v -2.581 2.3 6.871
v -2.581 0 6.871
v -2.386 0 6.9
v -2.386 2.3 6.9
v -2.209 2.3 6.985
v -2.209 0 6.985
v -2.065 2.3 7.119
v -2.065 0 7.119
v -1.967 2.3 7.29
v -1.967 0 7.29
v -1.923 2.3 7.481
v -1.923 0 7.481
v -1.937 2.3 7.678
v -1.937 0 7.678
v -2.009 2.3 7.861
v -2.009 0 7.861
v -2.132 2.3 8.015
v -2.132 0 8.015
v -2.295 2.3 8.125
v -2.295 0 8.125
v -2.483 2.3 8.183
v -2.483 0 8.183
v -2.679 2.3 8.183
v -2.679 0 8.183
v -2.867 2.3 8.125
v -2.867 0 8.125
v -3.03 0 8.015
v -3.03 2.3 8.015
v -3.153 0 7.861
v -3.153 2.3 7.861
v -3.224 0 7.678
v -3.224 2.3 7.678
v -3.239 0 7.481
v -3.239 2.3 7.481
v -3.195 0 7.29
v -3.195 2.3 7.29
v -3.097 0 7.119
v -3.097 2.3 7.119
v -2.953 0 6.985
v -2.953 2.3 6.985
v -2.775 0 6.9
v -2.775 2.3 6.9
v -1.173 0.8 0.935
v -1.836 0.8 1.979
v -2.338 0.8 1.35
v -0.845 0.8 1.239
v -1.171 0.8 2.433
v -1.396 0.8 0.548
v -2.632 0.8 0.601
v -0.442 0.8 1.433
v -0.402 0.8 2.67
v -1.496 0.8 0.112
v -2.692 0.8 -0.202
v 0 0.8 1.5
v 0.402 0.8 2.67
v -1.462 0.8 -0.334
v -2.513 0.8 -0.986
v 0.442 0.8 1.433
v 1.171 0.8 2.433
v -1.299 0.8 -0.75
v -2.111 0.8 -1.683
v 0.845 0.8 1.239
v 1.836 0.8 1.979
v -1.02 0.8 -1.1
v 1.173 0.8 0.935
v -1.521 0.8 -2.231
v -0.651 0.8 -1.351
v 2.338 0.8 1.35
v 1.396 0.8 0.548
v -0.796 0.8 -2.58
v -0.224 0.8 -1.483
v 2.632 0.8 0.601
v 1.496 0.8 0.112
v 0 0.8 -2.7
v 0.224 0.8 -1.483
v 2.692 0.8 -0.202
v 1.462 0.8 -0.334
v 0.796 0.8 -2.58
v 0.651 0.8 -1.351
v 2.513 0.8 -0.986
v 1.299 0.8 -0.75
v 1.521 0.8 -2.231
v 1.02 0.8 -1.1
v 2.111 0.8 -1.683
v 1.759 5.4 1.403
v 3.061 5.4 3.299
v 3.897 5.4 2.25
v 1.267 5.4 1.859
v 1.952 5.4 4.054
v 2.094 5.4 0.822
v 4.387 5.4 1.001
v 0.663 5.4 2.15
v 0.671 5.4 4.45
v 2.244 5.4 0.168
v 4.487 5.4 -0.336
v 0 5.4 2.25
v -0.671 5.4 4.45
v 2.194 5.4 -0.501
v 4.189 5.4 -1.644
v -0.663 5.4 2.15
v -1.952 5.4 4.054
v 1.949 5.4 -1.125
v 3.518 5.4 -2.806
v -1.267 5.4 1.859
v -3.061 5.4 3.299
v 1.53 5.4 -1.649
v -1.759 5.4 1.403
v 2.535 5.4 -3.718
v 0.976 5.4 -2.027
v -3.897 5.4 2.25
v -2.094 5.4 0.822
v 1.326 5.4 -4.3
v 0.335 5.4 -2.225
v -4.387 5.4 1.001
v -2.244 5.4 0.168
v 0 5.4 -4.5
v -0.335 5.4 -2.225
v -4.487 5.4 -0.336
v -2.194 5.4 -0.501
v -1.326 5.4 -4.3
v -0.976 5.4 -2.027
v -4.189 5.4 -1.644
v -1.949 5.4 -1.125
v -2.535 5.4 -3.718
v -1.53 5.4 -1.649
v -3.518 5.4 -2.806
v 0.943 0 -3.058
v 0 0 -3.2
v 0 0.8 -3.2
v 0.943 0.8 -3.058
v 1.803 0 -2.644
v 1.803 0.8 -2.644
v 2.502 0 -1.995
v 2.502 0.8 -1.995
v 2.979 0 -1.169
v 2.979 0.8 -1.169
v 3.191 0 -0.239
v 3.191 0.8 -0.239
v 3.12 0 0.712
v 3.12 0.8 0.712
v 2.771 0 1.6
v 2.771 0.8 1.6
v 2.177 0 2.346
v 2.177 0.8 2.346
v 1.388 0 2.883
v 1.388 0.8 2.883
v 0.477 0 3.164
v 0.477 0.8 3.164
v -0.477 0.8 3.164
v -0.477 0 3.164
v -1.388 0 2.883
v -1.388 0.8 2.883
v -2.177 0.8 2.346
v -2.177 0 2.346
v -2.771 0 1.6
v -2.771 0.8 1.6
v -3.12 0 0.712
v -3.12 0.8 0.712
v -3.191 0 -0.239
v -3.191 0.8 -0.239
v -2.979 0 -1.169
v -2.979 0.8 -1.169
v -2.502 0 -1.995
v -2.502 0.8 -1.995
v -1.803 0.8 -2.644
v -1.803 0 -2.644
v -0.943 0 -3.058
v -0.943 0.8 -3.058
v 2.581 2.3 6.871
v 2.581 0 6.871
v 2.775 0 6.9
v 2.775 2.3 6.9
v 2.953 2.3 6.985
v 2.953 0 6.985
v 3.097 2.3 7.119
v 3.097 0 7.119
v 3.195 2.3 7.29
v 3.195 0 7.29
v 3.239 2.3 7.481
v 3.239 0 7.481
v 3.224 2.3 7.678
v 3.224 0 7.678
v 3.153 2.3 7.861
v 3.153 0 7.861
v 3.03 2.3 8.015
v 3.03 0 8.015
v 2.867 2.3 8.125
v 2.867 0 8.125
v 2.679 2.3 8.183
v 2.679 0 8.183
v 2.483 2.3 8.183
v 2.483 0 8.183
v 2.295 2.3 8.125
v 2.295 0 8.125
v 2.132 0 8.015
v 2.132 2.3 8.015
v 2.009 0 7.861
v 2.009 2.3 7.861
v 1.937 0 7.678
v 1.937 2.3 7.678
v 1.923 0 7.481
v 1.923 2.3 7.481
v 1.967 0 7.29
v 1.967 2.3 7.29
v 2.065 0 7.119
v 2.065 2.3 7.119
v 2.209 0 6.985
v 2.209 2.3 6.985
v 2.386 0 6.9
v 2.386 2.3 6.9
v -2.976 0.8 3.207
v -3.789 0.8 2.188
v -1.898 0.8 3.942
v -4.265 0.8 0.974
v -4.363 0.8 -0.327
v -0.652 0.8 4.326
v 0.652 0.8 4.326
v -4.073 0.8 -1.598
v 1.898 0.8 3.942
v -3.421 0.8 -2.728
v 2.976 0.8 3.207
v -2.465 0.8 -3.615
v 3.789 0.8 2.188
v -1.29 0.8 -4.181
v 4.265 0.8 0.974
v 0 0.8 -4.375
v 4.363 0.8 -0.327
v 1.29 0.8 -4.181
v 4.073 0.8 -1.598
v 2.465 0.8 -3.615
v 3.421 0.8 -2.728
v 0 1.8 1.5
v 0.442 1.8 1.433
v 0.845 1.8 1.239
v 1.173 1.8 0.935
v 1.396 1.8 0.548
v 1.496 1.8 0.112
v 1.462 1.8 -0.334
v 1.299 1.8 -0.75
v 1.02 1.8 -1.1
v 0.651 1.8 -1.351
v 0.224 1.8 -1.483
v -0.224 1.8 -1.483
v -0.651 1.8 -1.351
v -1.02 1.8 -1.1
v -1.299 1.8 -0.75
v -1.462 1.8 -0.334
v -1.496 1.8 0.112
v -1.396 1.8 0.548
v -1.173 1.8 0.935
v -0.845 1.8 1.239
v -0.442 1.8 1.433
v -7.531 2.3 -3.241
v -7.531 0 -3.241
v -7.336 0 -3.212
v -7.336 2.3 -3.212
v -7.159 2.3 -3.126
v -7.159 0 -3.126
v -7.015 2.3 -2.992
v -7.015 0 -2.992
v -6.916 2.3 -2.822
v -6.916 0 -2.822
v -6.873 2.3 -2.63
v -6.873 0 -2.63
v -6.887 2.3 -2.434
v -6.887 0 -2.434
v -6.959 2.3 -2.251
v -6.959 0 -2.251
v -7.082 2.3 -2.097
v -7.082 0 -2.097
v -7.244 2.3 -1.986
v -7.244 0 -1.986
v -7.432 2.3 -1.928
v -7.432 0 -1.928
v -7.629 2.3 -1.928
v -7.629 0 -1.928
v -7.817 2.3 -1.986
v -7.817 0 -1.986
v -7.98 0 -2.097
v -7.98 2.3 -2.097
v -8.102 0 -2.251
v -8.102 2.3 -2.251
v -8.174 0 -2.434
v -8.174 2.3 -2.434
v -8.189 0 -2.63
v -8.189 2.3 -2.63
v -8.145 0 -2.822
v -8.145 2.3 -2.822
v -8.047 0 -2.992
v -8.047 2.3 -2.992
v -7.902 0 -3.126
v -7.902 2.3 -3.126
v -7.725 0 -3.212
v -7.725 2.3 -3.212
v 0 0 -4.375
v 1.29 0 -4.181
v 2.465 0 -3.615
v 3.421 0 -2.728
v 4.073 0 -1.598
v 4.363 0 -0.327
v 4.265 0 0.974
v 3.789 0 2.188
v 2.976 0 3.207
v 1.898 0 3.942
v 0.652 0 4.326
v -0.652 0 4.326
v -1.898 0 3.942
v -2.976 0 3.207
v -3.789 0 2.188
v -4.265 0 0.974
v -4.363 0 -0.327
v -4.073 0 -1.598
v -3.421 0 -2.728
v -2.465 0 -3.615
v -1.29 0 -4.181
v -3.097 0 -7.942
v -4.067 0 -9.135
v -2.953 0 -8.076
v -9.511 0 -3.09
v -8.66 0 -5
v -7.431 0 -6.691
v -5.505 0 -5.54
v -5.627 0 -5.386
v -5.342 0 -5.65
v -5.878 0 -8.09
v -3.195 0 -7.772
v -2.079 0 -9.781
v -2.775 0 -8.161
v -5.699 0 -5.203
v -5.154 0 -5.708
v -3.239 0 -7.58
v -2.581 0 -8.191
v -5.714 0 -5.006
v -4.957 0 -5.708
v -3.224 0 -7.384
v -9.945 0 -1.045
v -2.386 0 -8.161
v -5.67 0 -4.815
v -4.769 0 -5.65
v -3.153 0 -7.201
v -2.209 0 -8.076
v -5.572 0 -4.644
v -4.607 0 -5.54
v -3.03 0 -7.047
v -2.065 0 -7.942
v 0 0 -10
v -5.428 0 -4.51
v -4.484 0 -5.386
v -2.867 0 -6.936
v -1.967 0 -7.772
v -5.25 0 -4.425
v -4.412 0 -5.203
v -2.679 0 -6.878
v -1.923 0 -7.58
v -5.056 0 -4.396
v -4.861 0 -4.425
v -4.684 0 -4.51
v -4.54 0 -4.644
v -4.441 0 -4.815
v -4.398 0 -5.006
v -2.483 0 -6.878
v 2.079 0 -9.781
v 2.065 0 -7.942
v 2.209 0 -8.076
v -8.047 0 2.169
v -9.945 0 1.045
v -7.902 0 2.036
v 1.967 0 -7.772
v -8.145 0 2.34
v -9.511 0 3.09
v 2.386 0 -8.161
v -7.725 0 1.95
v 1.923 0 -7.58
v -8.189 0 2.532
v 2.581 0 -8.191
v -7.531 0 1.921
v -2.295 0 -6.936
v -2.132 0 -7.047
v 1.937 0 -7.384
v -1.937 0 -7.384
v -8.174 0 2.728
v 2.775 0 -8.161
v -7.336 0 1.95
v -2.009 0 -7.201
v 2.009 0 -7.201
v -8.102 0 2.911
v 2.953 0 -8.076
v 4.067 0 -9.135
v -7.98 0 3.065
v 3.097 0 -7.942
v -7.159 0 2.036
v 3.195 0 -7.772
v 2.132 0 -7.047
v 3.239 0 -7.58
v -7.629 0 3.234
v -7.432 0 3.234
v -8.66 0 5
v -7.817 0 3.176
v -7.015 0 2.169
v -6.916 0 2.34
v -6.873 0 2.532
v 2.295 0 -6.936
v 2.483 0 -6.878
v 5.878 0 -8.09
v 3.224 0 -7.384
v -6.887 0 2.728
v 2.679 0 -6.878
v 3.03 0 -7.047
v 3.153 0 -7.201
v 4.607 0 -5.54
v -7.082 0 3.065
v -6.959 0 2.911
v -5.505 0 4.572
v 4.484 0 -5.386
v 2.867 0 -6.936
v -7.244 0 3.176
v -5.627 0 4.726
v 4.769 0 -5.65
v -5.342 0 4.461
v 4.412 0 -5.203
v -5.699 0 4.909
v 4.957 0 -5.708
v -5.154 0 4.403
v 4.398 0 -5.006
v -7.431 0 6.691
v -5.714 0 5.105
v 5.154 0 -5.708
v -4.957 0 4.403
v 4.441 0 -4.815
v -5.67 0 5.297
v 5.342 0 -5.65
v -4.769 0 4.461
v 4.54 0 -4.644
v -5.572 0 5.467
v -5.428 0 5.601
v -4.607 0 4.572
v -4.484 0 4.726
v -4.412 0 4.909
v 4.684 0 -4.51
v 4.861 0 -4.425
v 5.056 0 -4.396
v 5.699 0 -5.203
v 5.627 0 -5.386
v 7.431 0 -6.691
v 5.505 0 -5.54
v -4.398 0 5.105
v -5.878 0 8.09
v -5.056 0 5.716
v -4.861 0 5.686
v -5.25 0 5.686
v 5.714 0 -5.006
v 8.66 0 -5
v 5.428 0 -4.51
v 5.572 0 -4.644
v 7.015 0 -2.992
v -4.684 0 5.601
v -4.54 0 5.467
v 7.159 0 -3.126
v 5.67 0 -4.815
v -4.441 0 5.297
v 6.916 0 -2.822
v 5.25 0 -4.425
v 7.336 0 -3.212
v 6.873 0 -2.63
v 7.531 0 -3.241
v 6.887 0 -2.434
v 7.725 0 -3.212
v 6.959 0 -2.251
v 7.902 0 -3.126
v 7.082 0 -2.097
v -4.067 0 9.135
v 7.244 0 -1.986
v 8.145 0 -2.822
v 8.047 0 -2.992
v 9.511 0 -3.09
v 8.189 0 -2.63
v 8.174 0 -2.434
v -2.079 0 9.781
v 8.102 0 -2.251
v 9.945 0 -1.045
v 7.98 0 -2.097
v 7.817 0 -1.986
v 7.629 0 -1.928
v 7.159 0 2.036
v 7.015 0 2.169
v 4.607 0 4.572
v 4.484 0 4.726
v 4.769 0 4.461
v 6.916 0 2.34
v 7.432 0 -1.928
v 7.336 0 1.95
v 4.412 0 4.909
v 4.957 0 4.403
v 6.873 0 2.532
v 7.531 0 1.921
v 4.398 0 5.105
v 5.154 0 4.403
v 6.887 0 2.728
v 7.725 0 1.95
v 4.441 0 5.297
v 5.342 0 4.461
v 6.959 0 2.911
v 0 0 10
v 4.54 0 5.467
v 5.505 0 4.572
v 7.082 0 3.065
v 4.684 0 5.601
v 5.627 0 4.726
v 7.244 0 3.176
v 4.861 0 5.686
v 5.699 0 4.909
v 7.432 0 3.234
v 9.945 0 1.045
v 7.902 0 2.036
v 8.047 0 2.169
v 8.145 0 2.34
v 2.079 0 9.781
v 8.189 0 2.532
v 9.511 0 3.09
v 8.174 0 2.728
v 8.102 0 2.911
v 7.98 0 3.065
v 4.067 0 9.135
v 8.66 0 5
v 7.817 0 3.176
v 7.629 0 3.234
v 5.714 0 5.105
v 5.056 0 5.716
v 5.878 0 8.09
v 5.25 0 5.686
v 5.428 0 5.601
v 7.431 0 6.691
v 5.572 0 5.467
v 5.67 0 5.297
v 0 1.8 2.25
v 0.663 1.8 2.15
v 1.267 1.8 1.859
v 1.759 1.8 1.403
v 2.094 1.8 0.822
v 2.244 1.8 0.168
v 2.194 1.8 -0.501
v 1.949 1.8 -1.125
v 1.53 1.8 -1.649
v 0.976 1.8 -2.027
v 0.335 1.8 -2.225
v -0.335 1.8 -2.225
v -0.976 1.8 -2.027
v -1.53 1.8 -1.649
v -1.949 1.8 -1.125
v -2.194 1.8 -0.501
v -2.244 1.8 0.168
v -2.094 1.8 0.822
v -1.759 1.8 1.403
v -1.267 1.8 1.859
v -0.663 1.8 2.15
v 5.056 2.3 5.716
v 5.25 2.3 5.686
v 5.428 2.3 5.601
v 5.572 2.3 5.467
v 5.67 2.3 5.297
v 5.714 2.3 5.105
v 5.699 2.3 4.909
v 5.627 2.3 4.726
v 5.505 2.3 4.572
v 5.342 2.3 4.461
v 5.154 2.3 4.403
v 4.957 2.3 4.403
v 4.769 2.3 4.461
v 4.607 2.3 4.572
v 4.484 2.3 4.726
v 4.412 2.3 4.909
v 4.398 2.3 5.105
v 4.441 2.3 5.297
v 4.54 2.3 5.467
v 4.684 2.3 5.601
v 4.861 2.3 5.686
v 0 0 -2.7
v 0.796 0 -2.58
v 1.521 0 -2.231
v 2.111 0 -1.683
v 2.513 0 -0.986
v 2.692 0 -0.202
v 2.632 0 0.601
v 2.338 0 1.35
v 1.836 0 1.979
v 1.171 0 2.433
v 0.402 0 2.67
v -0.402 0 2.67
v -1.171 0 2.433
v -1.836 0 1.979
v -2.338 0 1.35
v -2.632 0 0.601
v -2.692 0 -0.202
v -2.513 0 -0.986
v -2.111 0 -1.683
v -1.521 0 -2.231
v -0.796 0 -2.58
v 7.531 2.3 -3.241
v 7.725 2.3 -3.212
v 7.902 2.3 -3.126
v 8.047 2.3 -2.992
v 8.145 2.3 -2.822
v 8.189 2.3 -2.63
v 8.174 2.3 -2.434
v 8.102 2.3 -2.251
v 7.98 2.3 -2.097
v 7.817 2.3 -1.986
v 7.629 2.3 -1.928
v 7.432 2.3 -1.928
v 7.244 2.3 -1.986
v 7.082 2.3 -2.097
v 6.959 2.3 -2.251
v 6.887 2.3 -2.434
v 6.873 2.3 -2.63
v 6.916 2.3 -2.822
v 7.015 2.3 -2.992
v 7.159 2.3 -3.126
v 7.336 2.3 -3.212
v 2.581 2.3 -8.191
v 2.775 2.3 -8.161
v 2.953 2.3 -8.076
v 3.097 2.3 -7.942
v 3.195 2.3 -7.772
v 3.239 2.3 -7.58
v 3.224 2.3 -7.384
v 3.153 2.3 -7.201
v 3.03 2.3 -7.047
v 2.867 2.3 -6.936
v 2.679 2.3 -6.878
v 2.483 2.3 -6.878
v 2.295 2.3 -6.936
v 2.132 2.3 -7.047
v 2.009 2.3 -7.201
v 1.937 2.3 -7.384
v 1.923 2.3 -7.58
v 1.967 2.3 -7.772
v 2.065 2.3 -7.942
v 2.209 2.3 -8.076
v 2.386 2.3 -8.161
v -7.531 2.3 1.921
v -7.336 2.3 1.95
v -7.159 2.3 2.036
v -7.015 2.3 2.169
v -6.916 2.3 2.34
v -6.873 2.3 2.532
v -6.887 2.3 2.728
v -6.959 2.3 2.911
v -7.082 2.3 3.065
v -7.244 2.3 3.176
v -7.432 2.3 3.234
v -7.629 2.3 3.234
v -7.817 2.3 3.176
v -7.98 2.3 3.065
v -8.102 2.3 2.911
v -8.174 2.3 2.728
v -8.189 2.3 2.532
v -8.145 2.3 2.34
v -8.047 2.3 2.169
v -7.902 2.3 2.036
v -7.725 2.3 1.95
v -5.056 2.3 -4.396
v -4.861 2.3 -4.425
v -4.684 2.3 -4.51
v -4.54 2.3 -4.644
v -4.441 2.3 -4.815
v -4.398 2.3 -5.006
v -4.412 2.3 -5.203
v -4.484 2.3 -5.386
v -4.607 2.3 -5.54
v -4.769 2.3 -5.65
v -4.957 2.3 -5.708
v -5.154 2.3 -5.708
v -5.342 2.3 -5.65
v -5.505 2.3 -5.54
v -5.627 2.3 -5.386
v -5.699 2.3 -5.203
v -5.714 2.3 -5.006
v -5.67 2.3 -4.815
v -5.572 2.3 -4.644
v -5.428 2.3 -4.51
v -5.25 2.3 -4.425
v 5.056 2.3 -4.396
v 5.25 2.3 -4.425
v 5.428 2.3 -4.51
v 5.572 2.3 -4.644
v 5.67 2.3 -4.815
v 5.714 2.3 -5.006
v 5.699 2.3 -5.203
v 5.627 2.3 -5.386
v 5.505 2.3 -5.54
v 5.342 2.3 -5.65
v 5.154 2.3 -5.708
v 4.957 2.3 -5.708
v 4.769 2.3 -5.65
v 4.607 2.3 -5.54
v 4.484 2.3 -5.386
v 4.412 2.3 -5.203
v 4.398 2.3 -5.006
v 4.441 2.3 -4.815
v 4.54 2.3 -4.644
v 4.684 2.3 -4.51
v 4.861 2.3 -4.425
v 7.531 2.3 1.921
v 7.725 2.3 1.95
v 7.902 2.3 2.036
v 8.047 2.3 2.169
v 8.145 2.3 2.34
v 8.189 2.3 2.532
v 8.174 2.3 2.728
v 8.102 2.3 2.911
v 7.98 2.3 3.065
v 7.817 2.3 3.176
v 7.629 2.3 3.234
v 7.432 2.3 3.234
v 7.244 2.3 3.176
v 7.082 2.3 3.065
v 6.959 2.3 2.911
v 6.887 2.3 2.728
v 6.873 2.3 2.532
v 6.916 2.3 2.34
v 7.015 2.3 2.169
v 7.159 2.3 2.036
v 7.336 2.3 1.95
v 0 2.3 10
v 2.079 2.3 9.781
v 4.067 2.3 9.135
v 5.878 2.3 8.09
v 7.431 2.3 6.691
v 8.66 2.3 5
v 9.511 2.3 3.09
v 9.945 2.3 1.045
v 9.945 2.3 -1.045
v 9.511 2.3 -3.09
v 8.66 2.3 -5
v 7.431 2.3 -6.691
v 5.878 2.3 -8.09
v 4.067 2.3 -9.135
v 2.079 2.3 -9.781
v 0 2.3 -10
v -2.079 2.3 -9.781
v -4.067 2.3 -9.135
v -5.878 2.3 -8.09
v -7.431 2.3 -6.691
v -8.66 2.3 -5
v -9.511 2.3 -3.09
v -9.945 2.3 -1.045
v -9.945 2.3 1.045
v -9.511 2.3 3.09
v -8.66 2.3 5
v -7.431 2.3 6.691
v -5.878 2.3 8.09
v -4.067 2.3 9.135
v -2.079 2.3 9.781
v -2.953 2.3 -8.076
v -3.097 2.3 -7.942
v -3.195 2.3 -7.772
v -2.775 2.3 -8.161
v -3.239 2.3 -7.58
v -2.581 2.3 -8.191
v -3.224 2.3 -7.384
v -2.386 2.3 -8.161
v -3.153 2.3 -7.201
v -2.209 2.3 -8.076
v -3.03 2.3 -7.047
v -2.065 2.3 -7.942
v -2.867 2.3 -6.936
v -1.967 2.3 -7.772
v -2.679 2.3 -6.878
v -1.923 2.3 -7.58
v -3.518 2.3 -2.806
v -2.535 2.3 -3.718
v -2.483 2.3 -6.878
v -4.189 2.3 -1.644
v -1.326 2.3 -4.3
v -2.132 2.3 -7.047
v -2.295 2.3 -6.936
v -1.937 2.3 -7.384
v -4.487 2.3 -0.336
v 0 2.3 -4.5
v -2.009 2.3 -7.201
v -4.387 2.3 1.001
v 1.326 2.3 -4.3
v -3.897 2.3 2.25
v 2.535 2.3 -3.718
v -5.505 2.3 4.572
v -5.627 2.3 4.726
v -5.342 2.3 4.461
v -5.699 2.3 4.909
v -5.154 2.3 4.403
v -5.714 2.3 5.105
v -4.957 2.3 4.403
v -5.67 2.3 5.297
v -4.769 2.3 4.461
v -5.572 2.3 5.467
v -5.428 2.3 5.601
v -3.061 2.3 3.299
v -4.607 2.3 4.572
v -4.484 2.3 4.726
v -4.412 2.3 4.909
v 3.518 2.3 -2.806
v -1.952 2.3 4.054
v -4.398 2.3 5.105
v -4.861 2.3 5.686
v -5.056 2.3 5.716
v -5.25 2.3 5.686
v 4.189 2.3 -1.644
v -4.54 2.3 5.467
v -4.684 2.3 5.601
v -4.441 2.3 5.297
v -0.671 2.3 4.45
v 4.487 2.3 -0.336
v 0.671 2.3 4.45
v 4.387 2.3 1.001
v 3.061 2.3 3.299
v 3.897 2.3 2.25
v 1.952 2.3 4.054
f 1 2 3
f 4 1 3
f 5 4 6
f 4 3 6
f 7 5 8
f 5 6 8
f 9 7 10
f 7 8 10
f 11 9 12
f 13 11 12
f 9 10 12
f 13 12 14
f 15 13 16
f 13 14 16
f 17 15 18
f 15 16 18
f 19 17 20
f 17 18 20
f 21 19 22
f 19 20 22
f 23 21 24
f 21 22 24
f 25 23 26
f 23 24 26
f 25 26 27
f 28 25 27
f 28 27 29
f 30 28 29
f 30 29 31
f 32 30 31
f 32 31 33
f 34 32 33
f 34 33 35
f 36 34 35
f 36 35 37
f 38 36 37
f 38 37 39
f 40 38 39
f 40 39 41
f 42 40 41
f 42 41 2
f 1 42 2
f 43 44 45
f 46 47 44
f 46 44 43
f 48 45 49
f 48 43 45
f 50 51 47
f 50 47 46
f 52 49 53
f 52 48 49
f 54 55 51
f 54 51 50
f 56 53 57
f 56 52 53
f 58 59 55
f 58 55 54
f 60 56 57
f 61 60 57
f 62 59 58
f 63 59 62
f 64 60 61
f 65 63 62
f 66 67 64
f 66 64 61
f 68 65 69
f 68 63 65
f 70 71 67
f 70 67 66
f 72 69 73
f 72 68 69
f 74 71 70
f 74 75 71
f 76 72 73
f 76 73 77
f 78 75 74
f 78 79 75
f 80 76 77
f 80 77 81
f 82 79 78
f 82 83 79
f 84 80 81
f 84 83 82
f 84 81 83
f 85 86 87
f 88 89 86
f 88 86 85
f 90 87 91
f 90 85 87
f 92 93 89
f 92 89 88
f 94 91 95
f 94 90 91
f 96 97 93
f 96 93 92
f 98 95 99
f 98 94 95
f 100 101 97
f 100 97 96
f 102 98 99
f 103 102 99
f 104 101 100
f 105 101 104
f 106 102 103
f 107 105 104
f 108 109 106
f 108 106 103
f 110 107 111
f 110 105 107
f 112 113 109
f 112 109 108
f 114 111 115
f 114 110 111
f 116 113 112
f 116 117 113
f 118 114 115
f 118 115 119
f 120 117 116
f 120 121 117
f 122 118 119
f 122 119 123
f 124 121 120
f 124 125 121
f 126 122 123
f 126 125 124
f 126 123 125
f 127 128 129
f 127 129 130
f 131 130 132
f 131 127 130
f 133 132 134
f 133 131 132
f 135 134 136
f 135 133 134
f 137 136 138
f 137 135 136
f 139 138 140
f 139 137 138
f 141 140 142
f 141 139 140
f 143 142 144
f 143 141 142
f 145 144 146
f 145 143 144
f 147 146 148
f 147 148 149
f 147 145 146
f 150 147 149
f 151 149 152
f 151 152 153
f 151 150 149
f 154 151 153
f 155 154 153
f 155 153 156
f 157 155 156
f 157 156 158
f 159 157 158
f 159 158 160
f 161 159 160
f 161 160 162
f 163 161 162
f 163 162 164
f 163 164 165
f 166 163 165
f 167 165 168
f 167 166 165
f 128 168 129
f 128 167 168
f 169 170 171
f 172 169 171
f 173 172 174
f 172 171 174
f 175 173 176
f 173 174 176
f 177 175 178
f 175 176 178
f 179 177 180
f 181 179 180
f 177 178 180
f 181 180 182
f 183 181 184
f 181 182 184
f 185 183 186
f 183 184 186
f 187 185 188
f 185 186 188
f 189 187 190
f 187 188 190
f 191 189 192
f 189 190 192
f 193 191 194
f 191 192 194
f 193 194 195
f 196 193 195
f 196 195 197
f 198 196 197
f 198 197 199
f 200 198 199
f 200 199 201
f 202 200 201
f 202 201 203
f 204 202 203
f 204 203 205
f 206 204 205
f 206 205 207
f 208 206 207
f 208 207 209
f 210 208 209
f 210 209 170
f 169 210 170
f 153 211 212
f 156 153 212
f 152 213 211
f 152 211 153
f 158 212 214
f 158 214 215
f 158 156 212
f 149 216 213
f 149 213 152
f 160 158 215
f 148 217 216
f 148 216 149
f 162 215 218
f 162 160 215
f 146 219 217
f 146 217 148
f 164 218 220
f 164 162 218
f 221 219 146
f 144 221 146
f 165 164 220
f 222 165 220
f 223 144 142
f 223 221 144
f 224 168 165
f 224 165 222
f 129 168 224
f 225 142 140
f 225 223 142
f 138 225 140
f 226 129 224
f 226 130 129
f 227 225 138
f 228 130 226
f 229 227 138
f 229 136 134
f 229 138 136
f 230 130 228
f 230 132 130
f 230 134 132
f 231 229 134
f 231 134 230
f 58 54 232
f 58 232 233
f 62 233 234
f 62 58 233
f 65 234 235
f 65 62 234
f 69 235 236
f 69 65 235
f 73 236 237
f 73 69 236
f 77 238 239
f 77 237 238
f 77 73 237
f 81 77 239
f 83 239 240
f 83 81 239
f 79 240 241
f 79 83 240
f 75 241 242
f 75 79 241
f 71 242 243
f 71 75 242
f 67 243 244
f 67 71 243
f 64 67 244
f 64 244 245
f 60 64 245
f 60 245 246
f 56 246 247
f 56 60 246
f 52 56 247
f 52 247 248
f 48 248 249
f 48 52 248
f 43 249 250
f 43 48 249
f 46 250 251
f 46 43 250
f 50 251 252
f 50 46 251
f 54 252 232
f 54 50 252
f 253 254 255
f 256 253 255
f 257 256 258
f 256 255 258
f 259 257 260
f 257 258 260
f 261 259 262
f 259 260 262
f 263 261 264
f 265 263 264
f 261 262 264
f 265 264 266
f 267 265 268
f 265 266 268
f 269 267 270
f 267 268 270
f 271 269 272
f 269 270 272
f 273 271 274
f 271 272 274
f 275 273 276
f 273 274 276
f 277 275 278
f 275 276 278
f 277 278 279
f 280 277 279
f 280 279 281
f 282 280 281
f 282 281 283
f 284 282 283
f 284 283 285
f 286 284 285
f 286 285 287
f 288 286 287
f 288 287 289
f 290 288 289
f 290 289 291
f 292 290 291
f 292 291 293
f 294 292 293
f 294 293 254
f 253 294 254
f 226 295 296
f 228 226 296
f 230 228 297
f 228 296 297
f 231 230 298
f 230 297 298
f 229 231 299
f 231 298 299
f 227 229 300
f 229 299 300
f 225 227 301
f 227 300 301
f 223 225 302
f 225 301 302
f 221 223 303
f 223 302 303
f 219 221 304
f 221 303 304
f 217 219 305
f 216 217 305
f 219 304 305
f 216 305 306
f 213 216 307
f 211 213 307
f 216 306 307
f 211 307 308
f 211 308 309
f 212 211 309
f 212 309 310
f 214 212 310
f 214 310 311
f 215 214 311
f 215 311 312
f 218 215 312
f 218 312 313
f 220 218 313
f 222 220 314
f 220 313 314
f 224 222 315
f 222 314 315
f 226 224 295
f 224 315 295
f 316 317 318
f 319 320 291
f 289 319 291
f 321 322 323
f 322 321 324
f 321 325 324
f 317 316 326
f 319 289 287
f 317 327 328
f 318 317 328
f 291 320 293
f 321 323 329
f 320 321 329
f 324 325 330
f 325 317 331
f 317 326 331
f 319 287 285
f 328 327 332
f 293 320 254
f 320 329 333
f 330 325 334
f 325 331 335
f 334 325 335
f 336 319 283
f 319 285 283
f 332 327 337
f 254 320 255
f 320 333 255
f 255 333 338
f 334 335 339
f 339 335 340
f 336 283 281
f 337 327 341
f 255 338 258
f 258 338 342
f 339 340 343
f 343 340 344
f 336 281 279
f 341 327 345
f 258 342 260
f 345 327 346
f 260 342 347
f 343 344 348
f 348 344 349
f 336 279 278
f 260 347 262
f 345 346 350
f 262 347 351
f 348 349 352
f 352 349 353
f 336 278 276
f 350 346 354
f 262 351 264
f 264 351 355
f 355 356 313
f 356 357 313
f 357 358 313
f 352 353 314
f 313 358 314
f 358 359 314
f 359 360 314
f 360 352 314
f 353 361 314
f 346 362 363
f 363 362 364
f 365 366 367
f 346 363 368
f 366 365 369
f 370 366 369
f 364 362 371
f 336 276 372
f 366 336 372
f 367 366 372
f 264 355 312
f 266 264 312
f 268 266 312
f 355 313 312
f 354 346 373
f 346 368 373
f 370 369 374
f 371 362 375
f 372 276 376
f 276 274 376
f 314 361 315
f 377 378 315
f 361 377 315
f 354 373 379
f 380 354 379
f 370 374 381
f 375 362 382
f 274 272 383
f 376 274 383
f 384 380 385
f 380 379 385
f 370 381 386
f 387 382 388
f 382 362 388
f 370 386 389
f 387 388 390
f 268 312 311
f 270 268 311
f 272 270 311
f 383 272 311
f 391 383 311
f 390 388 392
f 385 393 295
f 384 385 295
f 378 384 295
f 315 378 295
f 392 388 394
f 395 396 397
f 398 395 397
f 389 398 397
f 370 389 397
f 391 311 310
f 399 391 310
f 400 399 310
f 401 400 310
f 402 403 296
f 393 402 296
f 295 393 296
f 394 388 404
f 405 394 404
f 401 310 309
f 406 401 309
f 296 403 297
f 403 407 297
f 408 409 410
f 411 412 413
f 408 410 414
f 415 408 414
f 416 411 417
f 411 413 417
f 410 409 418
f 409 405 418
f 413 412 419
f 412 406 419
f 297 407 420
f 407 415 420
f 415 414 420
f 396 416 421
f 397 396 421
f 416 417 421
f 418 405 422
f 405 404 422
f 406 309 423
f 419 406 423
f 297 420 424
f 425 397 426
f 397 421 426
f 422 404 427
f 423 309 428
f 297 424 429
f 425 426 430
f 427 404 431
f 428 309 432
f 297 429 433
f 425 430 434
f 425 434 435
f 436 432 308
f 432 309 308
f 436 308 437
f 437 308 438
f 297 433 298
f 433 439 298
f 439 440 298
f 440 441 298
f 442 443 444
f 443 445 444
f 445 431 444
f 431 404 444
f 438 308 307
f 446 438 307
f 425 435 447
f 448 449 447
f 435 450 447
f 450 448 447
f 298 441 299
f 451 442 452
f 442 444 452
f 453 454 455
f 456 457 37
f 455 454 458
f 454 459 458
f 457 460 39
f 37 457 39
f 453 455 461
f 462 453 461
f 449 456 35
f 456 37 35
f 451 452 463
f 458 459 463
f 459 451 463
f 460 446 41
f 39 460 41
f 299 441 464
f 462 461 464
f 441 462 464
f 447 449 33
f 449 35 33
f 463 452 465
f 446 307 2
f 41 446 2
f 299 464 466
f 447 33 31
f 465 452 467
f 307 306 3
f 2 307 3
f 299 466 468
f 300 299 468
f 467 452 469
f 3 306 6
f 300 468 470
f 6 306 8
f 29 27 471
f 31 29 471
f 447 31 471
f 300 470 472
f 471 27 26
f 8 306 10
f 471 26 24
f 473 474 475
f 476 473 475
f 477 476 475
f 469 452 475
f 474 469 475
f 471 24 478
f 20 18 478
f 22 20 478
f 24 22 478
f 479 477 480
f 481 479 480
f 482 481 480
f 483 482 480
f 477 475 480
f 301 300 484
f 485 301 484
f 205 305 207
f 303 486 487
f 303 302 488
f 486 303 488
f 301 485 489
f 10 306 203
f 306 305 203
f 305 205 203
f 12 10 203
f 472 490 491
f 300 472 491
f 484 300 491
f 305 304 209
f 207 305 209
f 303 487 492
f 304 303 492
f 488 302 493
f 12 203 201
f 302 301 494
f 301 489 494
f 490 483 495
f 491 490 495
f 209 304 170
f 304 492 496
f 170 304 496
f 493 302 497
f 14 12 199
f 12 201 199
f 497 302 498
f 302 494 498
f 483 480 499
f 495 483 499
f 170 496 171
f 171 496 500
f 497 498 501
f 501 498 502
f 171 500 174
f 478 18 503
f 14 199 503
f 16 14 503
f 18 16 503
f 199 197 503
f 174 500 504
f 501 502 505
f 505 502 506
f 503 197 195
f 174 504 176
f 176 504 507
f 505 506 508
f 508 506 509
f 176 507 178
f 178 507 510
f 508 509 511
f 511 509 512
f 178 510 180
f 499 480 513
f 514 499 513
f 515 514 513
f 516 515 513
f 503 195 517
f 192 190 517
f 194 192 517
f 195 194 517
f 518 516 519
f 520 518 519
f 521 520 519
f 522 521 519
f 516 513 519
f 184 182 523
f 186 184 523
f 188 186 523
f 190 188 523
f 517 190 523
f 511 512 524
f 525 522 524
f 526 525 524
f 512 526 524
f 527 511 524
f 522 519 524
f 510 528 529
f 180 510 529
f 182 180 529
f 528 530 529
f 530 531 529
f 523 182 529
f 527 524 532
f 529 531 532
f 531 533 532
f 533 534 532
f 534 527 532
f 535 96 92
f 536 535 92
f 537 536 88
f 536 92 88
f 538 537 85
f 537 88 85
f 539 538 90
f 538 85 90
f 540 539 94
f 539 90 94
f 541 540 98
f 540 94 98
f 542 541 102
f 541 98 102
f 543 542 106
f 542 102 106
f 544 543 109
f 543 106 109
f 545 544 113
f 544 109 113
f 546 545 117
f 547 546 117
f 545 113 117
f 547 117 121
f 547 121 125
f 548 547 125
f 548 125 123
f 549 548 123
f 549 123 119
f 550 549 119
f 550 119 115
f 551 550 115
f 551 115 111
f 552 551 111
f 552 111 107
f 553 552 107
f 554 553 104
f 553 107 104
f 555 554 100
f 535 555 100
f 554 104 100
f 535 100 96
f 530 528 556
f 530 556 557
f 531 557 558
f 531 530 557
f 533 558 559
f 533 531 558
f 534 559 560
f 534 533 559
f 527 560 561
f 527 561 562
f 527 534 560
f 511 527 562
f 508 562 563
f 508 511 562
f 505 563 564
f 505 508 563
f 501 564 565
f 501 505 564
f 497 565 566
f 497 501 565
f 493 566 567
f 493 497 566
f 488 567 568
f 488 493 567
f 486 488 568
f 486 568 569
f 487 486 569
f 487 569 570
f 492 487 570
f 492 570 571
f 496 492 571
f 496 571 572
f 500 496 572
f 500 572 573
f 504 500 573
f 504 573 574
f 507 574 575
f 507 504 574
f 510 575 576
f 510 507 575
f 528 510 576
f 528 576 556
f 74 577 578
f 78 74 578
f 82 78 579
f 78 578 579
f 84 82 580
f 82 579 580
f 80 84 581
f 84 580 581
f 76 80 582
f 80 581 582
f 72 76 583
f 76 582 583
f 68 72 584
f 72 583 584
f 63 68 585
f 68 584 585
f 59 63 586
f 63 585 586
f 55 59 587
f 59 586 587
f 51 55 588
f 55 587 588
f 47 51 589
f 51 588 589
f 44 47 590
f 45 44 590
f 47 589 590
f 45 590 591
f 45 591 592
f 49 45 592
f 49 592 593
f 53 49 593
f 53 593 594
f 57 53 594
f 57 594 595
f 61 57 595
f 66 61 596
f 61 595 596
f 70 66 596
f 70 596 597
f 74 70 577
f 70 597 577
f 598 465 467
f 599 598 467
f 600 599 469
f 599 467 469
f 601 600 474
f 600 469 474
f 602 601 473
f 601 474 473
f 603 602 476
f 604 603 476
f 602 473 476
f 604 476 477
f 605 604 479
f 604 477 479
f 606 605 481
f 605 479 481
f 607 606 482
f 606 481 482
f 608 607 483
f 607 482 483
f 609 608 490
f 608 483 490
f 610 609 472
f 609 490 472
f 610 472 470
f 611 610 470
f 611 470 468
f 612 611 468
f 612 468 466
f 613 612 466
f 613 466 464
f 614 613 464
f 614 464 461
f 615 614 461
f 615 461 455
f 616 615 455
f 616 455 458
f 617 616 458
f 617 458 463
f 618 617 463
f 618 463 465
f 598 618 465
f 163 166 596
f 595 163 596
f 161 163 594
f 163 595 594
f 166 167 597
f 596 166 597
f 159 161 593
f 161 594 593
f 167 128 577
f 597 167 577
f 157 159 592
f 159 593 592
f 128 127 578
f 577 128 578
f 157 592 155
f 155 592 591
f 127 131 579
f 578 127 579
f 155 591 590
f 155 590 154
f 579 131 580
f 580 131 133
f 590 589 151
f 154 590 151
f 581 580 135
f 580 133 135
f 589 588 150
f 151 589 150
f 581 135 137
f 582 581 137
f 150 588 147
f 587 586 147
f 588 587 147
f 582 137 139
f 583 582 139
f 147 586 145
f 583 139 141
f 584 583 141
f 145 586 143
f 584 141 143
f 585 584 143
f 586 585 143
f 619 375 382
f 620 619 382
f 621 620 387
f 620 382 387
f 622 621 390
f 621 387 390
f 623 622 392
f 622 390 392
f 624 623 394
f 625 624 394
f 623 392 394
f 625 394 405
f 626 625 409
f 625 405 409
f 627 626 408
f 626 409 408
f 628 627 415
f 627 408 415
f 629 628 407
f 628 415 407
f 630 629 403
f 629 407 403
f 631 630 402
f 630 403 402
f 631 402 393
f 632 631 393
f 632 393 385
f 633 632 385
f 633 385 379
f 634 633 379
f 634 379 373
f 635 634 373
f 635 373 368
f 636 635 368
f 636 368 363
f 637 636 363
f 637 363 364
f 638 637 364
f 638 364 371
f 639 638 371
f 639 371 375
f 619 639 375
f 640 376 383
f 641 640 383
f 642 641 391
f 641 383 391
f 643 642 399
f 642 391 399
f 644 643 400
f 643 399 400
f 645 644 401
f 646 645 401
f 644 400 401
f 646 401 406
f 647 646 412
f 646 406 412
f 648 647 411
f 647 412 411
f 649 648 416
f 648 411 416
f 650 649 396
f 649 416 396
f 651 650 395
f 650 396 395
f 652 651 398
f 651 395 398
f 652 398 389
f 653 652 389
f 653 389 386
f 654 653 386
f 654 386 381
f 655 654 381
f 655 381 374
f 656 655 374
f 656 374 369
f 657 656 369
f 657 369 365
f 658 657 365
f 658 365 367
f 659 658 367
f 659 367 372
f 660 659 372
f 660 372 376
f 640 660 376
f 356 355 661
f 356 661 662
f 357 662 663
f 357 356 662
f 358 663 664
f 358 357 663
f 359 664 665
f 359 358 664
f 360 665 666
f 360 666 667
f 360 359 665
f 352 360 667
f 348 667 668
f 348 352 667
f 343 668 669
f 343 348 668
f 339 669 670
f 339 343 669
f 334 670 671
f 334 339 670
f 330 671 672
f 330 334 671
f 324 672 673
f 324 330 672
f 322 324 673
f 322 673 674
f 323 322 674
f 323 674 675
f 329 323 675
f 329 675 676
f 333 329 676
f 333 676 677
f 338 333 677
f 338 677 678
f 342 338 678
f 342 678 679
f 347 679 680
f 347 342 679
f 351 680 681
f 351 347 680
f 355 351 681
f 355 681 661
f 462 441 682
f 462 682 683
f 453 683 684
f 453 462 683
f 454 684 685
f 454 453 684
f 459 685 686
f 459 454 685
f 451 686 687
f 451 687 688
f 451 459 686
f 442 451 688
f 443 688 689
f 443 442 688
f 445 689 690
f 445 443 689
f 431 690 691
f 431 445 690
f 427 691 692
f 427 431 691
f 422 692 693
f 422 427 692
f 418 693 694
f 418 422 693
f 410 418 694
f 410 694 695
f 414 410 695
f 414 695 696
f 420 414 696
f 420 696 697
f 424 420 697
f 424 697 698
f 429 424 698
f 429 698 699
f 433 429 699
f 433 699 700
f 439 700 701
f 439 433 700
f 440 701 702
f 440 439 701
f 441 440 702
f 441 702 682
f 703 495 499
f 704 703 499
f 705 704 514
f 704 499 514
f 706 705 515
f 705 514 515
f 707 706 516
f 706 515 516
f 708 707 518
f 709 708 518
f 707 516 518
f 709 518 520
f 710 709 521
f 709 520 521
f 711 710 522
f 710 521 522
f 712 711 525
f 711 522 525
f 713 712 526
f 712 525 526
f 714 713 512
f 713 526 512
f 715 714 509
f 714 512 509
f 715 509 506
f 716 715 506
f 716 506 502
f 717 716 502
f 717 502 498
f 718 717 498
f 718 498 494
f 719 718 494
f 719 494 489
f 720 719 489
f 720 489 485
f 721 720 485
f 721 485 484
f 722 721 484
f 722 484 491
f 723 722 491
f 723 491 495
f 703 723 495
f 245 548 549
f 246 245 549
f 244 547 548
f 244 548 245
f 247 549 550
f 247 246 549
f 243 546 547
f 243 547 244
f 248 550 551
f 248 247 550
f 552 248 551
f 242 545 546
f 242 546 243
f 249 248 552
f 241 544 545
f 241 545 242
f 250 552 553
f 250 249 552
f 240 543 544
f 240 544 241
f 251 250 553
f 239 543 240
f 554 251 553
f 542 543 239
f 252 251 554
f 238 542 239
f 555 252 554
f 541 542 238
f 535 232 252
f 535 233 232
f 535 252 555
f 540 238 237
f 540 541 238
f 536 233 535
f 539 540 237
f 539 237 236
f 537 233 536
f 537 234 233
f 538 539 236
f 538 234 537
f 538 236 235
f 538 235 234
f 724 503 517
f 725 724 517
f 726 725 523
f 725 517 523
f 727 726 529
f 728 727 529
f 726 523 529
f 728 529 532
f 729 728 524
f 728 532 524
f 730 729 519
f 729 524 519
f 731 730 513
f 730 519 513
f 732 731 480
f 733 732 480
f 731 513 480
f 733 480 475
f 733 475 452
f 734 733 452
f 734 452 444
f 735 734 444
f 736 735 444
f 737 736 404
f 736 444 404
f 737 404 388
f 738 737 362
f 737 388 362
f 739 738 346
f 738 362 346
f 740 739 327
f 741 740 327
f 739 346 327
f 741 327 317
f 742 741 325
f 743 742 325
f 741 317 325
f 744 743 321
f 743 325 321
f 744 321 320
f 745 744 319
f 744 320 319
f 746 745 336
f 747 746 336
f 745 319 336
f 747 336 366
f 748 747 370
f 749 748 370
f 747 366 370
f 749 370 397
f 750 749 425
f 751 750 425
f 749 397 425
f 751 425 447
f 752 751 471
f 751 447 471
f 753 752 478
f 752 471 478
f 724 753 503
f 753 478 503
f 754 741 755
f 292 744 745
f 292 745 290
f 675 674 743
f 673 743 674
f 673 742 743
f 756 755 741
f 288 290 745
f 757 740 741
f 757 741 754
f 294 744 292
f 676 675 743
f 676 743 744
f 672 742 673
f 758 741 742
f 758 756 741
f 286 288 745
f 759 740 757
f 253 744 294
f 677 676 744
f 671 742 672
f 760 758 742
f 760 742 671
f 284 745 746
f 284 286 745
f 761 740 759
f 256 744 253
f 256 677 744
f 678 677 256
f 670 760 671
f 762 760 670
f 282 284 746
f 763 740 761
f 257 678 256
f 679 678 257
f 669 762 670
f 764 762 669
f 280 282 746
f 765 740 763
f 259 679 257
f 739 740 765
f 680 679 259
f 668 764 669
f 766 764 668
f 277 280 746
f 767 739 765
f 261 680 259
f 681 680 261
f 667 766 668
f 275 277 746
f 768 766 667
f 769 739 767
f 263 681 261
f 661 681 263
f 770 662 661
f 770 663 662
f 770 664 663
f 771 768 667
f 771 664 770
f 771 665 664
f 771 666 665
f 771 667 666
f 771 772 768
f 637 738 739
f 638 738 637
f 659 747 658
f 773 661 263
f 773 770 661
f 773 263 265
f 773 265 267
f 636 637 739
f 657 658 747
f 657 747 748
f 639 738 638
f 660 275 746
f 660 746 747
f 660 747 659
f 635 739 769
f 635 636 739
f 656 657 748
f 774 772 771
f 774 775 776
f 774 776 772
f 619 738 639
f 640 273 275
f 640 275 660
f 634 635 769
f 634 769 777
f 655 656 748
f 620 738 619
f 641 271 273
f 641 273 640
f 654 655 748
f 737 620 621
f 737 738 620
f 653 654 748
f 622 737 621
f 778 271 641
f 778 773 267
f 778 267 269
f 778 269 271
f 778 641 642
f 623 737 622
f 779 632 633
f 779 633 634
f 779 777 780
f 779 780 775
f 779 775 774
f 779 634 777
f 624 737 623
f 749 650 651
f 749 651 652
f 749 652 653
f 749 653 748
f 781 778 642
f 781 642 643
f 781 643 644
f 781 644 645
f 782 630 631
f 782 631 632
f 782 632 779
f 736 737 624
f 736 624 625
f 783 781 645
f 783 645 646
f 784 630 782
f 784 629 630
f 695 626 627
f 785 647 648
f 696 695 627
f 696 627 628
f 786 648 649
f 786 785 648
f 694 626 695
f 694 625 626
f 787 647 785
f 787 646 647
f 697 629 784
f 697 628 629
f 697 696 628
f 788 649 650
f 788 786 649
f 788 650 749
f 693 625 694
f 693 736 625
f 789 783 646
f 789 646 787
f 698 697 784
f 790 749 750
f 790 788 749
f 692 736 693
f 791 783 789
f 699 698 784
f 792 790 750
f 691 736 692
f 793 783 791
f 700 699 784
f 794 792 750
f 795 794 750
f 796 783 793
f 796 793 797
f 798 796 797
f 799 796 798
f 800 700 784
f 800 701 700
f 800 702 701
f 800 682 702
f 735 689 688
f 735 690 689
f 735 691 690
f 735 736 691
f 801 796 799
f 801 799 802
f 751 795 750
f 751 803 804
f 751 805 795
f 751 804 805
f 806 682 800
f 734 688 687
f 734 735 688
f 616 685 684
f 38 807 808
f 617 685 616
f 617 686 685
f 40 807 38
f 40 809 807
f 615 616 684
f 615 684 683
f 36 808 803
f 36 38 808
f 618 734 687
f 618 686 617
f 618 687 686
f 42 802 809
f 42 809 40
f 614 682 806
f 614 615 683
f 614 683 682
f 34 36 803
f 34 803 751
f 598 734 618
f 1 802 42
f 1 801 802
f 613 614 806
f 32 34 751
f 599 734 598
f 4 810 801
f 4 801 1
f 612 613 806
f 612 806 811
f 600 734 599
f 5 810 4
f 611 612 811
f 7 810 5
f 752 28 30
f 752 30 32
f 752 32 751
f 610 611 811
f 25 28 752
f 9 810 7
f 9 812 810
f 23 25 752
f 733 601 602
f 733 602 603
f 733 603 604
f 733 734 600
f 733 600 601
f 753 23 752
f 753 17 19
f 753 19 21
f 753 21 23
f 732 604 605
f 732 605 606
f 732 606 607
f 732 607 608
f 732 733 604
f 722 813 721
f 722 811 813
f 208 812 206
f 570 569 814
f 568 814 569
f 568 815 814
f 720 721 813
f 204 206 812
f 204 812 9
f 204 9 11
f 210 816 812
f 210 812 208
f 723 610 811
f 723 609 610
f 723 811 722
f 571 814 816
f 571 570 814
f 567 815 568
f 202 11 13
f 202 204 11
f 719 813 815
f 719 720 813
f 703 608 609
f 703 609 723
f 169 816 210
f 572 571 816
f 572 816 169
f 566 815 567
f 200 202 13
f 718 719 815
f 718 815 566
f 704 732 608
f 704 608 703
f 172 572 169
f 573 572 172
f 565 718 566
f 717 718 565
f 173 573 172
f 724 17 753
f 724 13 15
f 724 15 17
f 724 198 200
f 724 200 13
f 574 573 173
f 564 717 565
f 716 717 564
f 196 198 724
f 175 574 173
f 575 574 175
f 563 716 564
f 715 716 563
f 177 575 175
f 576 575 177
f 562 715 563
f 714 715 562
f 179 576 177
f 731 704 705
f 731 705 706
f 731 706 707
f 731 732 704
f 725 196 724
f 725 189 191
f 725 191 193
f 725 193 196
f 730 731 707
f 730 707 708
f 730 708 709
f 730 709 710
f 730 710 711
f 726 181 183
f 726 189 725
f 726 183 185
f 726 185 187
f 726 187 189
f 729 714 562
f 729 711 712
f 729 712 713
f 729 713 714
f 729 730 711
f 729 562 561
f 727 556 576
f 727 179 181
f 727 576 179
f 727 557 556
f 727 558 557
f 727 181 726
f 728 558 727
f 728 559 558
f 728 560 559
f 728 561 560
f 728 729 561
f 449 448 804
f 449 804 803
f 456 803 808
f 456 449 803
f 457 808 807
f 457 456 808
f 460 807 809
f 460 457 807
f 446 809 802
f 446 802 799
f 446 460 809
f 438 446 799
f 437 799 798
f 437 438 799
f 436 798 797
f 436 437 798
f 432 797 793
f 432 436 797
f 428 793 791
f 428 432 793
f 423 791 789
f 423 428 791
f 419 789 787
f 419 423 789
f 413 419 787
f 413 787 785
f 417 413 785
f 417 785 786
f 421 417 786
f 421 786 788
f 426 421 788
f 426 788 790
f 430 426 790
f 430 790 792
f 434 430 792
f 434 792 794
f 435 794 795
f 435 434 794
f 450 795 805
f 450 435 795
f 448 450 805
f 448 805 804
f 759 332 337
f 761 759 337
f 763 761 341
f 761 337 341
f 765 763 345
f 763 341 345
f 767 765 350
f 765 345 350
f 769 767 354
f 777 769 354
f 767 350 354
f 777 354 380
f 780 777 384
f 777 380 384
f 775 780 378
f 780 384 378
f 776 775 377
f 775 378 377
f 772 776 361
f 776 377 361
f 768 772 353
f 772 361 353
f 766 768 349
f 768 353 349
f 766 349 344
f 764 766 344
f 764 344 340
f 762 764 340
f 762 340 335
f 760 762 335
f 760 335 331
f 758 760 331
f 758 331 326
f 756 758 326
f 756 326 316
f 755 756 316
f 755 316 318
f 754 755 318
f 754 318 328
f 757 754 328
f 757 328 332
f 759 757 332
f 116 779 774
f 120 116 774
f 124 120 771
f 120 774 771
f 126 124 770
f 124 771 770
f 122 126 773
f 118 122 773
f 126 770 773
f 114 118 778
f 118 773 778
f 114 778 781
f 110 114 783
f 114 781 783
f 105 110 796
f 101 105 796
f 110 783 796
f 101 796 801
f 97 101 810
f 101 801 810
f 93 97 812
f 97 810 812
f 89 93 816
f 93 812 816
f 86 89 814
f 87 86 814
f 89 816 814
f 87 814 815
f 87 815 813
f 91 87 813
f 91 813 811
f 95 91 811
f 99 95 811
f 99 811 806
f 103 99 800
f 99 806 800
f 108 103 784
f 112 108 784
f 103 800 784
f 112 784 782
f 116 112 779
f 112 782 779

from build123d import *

# Parameters (mm, degrees)
SKETCH1_R           = 10
SKETCH1_R_2         = 0.66
SKETCH1_R_3         = 1.5
BOSS_EXTRUDE1_DEPTH = 2.3
SKETCH2_R           = 4.5
SKETCH2_R_2         = 1.5
BOSS_EXTRUDE2_DEPTH = 3.1
SKETCH3_R           = 2.25
CUT_EXTRUDE1_DEPTH  = 3.6
SKETCH_1_R          = 0.66
CUT_EXTRUDE_1_DEPTH = 16.138031576
SKETCH_2_R          = 4.375
SKETCH_2_R_2        = 3.2
SKETCH_2_R_3        = 2.7
SKETCH_2_R_4        = 1.5
CUT_EXTRUDE_2_DEPTH = 0.8


with BuildPart() as part:
    # Sketch1 → Boss-Extrude1 (new body)
    with BuildSketch(Plane(origin=(0, 0, 0), x_dir=(1, 0, 0), z_dir=(0, 1, 0))):
        with Locations(Location((0, 0, 0), (0, 0, 270))):
            Circle(SKETCH1_R)
        with Locations(Location((-5.055813485, 5.055813485, 0), (0, 0, 270))):
            Circle(SKETCH1_R_2, mode=Mode.SUBTRACT)
        with Locations(Location((5.055813485, 5.055813485, 0), (0, 0, 270))):
            Circle(SKETCH1_R_2, mode=Mode.SUBTRACT)
        with Locations(Location((5.055813485, -5.055813485, 0), (0, 0, 270))):
            Circle(SKETCH1_R_2, mode=Mode.SUBTRACT)
        with Locations(Location((-5.055813485, -5.055813485, 0), (0, 0, 270))):
            Circle(SKETCH1_R_2, mode=Mode.SUBTRACT)
        with Locations(Location((0, 0, 0), (0, 0, 270))):
            Circle(SKETCH1_R_3, mode=Mode.SUBTRACT)
    extrude(amount=BOSS_EXTRUDE1_DEPTH)

    # Sketch2 → Boss-Extrude2 (add)
    with BuildSketch(Plane(origin=(0, 2.3, 0), x_dir=(1, 0, 0), z_dir=(0, 1, 0))):
        with Locations(Location((0, 0, 0), (0, 0, 90))):
            Circle(SKETCH2_R)
        with Locations(Location((0, 0, 0), (0, 0, 270))):
            Circle(SKETCH2_R_2, mode=Mode.SUBTRACT)
    extrude(amount=BOSS_EXTRUDE2_DEPTH)

    # Sketch3 → Cut-Extrude1 (cut)
    with BuildSketch(Plane(origin=(0, 5.4, 0), x_dir=(1, 0, 0), z_dir=(0, 1, 0))):
        with Locations(Location((0, 0, 0), (0, 0, 270))):
            Circle(SKETCH3_R)
    extrude(amount=-CUT_EXTRUDE1_DEPTH, mode=Mode.SUBTRACT)

    # ｽｹｯﾁ1 → ｶｯﾄ - 押し出し1 (cut, through all)
    with BuildSketch(Plane(origin=(0, 0, 0), x_dir=(-1, 0, 0), z_dir=(0, -1, 0))):
        with Locations(Location((-2.580939751, -7.53068722, 0), (0, 0, 90))):
            Circle(SKETCH_1_R)
        with Locations(Location((-7.53068722, -2.580939751, 0), (0, 0, 90))):
            Circle(SKETCH_1_R)
        with Locations(Location((-7.53068722, 2.580939751, 0), (0, 0, 90))):
            Circle(SKETCH_1_R)
        with Locations(Location((-2.580939751, 7.53068722, 0), (0, 0, 90))):
            Circle(SKETCH_1_R)
        with Locations(Location((2.580939751, 7.53068722, 0), (0, 0, 90))):
            Circle(SKETCH_1_R)
        with Locations(Location((7.53068722, 2.580939751, 0), (0, 0, 90))):
            Circle(SKETCH_1_R)
        with Locations(Location((7.53068722, -2.580939751, 0), (0, 0, 90))):
            Circle(SKETCH_1_R)
        with Locations(Location((2.580939751, -7.53068722, 0), (0, 0, 90))):
            Circle(SKETCH_1_R)
    extrude(amount=-CUT_EXTRUDE_1_DEPTH, mode=Mode.SUBTRACT)

    # ｽｹｯﾁ2 → ｶｯﾄ - 押し出し2 (cut)
    # profile 1 of 2: a face of its own
    with BuildSketch(Plane(origin=(0, 0, 0), x_dir=(-1, 0, 0), z_dir=(0, -1, 0))):
        with Locations(Location((0, 0, 0), (0, 0, 90))):
            Circle(SKETCH_2_R)
        with Locations(Location((0, 0, 0), (0, 0, 90))):
            Circle(SKETCH_2_R_2, mode=Mode.SUBTRACT)
    # profile 2 of 2: a face of its own
    with BuildSketch(Plane(origin=(0, 0, 0), x_dir=(-1, 0, 0), z_dir=(0, -1, 0))):
        with Locations(Location((0, 0, 0), (0, 0, 90))):
            Circle(SKETCH_2_R_3)
        with Locations(Location((0, 0, 0), (0, 0, 90))):
            Circle(SKETCH_2_R_4, mode=Mode.SUBTRACT)
    extrude(amount=-CUT_EXTRUDE_2_DEPTH, mode=Mode.SUBTRACT)


solid = part.part
